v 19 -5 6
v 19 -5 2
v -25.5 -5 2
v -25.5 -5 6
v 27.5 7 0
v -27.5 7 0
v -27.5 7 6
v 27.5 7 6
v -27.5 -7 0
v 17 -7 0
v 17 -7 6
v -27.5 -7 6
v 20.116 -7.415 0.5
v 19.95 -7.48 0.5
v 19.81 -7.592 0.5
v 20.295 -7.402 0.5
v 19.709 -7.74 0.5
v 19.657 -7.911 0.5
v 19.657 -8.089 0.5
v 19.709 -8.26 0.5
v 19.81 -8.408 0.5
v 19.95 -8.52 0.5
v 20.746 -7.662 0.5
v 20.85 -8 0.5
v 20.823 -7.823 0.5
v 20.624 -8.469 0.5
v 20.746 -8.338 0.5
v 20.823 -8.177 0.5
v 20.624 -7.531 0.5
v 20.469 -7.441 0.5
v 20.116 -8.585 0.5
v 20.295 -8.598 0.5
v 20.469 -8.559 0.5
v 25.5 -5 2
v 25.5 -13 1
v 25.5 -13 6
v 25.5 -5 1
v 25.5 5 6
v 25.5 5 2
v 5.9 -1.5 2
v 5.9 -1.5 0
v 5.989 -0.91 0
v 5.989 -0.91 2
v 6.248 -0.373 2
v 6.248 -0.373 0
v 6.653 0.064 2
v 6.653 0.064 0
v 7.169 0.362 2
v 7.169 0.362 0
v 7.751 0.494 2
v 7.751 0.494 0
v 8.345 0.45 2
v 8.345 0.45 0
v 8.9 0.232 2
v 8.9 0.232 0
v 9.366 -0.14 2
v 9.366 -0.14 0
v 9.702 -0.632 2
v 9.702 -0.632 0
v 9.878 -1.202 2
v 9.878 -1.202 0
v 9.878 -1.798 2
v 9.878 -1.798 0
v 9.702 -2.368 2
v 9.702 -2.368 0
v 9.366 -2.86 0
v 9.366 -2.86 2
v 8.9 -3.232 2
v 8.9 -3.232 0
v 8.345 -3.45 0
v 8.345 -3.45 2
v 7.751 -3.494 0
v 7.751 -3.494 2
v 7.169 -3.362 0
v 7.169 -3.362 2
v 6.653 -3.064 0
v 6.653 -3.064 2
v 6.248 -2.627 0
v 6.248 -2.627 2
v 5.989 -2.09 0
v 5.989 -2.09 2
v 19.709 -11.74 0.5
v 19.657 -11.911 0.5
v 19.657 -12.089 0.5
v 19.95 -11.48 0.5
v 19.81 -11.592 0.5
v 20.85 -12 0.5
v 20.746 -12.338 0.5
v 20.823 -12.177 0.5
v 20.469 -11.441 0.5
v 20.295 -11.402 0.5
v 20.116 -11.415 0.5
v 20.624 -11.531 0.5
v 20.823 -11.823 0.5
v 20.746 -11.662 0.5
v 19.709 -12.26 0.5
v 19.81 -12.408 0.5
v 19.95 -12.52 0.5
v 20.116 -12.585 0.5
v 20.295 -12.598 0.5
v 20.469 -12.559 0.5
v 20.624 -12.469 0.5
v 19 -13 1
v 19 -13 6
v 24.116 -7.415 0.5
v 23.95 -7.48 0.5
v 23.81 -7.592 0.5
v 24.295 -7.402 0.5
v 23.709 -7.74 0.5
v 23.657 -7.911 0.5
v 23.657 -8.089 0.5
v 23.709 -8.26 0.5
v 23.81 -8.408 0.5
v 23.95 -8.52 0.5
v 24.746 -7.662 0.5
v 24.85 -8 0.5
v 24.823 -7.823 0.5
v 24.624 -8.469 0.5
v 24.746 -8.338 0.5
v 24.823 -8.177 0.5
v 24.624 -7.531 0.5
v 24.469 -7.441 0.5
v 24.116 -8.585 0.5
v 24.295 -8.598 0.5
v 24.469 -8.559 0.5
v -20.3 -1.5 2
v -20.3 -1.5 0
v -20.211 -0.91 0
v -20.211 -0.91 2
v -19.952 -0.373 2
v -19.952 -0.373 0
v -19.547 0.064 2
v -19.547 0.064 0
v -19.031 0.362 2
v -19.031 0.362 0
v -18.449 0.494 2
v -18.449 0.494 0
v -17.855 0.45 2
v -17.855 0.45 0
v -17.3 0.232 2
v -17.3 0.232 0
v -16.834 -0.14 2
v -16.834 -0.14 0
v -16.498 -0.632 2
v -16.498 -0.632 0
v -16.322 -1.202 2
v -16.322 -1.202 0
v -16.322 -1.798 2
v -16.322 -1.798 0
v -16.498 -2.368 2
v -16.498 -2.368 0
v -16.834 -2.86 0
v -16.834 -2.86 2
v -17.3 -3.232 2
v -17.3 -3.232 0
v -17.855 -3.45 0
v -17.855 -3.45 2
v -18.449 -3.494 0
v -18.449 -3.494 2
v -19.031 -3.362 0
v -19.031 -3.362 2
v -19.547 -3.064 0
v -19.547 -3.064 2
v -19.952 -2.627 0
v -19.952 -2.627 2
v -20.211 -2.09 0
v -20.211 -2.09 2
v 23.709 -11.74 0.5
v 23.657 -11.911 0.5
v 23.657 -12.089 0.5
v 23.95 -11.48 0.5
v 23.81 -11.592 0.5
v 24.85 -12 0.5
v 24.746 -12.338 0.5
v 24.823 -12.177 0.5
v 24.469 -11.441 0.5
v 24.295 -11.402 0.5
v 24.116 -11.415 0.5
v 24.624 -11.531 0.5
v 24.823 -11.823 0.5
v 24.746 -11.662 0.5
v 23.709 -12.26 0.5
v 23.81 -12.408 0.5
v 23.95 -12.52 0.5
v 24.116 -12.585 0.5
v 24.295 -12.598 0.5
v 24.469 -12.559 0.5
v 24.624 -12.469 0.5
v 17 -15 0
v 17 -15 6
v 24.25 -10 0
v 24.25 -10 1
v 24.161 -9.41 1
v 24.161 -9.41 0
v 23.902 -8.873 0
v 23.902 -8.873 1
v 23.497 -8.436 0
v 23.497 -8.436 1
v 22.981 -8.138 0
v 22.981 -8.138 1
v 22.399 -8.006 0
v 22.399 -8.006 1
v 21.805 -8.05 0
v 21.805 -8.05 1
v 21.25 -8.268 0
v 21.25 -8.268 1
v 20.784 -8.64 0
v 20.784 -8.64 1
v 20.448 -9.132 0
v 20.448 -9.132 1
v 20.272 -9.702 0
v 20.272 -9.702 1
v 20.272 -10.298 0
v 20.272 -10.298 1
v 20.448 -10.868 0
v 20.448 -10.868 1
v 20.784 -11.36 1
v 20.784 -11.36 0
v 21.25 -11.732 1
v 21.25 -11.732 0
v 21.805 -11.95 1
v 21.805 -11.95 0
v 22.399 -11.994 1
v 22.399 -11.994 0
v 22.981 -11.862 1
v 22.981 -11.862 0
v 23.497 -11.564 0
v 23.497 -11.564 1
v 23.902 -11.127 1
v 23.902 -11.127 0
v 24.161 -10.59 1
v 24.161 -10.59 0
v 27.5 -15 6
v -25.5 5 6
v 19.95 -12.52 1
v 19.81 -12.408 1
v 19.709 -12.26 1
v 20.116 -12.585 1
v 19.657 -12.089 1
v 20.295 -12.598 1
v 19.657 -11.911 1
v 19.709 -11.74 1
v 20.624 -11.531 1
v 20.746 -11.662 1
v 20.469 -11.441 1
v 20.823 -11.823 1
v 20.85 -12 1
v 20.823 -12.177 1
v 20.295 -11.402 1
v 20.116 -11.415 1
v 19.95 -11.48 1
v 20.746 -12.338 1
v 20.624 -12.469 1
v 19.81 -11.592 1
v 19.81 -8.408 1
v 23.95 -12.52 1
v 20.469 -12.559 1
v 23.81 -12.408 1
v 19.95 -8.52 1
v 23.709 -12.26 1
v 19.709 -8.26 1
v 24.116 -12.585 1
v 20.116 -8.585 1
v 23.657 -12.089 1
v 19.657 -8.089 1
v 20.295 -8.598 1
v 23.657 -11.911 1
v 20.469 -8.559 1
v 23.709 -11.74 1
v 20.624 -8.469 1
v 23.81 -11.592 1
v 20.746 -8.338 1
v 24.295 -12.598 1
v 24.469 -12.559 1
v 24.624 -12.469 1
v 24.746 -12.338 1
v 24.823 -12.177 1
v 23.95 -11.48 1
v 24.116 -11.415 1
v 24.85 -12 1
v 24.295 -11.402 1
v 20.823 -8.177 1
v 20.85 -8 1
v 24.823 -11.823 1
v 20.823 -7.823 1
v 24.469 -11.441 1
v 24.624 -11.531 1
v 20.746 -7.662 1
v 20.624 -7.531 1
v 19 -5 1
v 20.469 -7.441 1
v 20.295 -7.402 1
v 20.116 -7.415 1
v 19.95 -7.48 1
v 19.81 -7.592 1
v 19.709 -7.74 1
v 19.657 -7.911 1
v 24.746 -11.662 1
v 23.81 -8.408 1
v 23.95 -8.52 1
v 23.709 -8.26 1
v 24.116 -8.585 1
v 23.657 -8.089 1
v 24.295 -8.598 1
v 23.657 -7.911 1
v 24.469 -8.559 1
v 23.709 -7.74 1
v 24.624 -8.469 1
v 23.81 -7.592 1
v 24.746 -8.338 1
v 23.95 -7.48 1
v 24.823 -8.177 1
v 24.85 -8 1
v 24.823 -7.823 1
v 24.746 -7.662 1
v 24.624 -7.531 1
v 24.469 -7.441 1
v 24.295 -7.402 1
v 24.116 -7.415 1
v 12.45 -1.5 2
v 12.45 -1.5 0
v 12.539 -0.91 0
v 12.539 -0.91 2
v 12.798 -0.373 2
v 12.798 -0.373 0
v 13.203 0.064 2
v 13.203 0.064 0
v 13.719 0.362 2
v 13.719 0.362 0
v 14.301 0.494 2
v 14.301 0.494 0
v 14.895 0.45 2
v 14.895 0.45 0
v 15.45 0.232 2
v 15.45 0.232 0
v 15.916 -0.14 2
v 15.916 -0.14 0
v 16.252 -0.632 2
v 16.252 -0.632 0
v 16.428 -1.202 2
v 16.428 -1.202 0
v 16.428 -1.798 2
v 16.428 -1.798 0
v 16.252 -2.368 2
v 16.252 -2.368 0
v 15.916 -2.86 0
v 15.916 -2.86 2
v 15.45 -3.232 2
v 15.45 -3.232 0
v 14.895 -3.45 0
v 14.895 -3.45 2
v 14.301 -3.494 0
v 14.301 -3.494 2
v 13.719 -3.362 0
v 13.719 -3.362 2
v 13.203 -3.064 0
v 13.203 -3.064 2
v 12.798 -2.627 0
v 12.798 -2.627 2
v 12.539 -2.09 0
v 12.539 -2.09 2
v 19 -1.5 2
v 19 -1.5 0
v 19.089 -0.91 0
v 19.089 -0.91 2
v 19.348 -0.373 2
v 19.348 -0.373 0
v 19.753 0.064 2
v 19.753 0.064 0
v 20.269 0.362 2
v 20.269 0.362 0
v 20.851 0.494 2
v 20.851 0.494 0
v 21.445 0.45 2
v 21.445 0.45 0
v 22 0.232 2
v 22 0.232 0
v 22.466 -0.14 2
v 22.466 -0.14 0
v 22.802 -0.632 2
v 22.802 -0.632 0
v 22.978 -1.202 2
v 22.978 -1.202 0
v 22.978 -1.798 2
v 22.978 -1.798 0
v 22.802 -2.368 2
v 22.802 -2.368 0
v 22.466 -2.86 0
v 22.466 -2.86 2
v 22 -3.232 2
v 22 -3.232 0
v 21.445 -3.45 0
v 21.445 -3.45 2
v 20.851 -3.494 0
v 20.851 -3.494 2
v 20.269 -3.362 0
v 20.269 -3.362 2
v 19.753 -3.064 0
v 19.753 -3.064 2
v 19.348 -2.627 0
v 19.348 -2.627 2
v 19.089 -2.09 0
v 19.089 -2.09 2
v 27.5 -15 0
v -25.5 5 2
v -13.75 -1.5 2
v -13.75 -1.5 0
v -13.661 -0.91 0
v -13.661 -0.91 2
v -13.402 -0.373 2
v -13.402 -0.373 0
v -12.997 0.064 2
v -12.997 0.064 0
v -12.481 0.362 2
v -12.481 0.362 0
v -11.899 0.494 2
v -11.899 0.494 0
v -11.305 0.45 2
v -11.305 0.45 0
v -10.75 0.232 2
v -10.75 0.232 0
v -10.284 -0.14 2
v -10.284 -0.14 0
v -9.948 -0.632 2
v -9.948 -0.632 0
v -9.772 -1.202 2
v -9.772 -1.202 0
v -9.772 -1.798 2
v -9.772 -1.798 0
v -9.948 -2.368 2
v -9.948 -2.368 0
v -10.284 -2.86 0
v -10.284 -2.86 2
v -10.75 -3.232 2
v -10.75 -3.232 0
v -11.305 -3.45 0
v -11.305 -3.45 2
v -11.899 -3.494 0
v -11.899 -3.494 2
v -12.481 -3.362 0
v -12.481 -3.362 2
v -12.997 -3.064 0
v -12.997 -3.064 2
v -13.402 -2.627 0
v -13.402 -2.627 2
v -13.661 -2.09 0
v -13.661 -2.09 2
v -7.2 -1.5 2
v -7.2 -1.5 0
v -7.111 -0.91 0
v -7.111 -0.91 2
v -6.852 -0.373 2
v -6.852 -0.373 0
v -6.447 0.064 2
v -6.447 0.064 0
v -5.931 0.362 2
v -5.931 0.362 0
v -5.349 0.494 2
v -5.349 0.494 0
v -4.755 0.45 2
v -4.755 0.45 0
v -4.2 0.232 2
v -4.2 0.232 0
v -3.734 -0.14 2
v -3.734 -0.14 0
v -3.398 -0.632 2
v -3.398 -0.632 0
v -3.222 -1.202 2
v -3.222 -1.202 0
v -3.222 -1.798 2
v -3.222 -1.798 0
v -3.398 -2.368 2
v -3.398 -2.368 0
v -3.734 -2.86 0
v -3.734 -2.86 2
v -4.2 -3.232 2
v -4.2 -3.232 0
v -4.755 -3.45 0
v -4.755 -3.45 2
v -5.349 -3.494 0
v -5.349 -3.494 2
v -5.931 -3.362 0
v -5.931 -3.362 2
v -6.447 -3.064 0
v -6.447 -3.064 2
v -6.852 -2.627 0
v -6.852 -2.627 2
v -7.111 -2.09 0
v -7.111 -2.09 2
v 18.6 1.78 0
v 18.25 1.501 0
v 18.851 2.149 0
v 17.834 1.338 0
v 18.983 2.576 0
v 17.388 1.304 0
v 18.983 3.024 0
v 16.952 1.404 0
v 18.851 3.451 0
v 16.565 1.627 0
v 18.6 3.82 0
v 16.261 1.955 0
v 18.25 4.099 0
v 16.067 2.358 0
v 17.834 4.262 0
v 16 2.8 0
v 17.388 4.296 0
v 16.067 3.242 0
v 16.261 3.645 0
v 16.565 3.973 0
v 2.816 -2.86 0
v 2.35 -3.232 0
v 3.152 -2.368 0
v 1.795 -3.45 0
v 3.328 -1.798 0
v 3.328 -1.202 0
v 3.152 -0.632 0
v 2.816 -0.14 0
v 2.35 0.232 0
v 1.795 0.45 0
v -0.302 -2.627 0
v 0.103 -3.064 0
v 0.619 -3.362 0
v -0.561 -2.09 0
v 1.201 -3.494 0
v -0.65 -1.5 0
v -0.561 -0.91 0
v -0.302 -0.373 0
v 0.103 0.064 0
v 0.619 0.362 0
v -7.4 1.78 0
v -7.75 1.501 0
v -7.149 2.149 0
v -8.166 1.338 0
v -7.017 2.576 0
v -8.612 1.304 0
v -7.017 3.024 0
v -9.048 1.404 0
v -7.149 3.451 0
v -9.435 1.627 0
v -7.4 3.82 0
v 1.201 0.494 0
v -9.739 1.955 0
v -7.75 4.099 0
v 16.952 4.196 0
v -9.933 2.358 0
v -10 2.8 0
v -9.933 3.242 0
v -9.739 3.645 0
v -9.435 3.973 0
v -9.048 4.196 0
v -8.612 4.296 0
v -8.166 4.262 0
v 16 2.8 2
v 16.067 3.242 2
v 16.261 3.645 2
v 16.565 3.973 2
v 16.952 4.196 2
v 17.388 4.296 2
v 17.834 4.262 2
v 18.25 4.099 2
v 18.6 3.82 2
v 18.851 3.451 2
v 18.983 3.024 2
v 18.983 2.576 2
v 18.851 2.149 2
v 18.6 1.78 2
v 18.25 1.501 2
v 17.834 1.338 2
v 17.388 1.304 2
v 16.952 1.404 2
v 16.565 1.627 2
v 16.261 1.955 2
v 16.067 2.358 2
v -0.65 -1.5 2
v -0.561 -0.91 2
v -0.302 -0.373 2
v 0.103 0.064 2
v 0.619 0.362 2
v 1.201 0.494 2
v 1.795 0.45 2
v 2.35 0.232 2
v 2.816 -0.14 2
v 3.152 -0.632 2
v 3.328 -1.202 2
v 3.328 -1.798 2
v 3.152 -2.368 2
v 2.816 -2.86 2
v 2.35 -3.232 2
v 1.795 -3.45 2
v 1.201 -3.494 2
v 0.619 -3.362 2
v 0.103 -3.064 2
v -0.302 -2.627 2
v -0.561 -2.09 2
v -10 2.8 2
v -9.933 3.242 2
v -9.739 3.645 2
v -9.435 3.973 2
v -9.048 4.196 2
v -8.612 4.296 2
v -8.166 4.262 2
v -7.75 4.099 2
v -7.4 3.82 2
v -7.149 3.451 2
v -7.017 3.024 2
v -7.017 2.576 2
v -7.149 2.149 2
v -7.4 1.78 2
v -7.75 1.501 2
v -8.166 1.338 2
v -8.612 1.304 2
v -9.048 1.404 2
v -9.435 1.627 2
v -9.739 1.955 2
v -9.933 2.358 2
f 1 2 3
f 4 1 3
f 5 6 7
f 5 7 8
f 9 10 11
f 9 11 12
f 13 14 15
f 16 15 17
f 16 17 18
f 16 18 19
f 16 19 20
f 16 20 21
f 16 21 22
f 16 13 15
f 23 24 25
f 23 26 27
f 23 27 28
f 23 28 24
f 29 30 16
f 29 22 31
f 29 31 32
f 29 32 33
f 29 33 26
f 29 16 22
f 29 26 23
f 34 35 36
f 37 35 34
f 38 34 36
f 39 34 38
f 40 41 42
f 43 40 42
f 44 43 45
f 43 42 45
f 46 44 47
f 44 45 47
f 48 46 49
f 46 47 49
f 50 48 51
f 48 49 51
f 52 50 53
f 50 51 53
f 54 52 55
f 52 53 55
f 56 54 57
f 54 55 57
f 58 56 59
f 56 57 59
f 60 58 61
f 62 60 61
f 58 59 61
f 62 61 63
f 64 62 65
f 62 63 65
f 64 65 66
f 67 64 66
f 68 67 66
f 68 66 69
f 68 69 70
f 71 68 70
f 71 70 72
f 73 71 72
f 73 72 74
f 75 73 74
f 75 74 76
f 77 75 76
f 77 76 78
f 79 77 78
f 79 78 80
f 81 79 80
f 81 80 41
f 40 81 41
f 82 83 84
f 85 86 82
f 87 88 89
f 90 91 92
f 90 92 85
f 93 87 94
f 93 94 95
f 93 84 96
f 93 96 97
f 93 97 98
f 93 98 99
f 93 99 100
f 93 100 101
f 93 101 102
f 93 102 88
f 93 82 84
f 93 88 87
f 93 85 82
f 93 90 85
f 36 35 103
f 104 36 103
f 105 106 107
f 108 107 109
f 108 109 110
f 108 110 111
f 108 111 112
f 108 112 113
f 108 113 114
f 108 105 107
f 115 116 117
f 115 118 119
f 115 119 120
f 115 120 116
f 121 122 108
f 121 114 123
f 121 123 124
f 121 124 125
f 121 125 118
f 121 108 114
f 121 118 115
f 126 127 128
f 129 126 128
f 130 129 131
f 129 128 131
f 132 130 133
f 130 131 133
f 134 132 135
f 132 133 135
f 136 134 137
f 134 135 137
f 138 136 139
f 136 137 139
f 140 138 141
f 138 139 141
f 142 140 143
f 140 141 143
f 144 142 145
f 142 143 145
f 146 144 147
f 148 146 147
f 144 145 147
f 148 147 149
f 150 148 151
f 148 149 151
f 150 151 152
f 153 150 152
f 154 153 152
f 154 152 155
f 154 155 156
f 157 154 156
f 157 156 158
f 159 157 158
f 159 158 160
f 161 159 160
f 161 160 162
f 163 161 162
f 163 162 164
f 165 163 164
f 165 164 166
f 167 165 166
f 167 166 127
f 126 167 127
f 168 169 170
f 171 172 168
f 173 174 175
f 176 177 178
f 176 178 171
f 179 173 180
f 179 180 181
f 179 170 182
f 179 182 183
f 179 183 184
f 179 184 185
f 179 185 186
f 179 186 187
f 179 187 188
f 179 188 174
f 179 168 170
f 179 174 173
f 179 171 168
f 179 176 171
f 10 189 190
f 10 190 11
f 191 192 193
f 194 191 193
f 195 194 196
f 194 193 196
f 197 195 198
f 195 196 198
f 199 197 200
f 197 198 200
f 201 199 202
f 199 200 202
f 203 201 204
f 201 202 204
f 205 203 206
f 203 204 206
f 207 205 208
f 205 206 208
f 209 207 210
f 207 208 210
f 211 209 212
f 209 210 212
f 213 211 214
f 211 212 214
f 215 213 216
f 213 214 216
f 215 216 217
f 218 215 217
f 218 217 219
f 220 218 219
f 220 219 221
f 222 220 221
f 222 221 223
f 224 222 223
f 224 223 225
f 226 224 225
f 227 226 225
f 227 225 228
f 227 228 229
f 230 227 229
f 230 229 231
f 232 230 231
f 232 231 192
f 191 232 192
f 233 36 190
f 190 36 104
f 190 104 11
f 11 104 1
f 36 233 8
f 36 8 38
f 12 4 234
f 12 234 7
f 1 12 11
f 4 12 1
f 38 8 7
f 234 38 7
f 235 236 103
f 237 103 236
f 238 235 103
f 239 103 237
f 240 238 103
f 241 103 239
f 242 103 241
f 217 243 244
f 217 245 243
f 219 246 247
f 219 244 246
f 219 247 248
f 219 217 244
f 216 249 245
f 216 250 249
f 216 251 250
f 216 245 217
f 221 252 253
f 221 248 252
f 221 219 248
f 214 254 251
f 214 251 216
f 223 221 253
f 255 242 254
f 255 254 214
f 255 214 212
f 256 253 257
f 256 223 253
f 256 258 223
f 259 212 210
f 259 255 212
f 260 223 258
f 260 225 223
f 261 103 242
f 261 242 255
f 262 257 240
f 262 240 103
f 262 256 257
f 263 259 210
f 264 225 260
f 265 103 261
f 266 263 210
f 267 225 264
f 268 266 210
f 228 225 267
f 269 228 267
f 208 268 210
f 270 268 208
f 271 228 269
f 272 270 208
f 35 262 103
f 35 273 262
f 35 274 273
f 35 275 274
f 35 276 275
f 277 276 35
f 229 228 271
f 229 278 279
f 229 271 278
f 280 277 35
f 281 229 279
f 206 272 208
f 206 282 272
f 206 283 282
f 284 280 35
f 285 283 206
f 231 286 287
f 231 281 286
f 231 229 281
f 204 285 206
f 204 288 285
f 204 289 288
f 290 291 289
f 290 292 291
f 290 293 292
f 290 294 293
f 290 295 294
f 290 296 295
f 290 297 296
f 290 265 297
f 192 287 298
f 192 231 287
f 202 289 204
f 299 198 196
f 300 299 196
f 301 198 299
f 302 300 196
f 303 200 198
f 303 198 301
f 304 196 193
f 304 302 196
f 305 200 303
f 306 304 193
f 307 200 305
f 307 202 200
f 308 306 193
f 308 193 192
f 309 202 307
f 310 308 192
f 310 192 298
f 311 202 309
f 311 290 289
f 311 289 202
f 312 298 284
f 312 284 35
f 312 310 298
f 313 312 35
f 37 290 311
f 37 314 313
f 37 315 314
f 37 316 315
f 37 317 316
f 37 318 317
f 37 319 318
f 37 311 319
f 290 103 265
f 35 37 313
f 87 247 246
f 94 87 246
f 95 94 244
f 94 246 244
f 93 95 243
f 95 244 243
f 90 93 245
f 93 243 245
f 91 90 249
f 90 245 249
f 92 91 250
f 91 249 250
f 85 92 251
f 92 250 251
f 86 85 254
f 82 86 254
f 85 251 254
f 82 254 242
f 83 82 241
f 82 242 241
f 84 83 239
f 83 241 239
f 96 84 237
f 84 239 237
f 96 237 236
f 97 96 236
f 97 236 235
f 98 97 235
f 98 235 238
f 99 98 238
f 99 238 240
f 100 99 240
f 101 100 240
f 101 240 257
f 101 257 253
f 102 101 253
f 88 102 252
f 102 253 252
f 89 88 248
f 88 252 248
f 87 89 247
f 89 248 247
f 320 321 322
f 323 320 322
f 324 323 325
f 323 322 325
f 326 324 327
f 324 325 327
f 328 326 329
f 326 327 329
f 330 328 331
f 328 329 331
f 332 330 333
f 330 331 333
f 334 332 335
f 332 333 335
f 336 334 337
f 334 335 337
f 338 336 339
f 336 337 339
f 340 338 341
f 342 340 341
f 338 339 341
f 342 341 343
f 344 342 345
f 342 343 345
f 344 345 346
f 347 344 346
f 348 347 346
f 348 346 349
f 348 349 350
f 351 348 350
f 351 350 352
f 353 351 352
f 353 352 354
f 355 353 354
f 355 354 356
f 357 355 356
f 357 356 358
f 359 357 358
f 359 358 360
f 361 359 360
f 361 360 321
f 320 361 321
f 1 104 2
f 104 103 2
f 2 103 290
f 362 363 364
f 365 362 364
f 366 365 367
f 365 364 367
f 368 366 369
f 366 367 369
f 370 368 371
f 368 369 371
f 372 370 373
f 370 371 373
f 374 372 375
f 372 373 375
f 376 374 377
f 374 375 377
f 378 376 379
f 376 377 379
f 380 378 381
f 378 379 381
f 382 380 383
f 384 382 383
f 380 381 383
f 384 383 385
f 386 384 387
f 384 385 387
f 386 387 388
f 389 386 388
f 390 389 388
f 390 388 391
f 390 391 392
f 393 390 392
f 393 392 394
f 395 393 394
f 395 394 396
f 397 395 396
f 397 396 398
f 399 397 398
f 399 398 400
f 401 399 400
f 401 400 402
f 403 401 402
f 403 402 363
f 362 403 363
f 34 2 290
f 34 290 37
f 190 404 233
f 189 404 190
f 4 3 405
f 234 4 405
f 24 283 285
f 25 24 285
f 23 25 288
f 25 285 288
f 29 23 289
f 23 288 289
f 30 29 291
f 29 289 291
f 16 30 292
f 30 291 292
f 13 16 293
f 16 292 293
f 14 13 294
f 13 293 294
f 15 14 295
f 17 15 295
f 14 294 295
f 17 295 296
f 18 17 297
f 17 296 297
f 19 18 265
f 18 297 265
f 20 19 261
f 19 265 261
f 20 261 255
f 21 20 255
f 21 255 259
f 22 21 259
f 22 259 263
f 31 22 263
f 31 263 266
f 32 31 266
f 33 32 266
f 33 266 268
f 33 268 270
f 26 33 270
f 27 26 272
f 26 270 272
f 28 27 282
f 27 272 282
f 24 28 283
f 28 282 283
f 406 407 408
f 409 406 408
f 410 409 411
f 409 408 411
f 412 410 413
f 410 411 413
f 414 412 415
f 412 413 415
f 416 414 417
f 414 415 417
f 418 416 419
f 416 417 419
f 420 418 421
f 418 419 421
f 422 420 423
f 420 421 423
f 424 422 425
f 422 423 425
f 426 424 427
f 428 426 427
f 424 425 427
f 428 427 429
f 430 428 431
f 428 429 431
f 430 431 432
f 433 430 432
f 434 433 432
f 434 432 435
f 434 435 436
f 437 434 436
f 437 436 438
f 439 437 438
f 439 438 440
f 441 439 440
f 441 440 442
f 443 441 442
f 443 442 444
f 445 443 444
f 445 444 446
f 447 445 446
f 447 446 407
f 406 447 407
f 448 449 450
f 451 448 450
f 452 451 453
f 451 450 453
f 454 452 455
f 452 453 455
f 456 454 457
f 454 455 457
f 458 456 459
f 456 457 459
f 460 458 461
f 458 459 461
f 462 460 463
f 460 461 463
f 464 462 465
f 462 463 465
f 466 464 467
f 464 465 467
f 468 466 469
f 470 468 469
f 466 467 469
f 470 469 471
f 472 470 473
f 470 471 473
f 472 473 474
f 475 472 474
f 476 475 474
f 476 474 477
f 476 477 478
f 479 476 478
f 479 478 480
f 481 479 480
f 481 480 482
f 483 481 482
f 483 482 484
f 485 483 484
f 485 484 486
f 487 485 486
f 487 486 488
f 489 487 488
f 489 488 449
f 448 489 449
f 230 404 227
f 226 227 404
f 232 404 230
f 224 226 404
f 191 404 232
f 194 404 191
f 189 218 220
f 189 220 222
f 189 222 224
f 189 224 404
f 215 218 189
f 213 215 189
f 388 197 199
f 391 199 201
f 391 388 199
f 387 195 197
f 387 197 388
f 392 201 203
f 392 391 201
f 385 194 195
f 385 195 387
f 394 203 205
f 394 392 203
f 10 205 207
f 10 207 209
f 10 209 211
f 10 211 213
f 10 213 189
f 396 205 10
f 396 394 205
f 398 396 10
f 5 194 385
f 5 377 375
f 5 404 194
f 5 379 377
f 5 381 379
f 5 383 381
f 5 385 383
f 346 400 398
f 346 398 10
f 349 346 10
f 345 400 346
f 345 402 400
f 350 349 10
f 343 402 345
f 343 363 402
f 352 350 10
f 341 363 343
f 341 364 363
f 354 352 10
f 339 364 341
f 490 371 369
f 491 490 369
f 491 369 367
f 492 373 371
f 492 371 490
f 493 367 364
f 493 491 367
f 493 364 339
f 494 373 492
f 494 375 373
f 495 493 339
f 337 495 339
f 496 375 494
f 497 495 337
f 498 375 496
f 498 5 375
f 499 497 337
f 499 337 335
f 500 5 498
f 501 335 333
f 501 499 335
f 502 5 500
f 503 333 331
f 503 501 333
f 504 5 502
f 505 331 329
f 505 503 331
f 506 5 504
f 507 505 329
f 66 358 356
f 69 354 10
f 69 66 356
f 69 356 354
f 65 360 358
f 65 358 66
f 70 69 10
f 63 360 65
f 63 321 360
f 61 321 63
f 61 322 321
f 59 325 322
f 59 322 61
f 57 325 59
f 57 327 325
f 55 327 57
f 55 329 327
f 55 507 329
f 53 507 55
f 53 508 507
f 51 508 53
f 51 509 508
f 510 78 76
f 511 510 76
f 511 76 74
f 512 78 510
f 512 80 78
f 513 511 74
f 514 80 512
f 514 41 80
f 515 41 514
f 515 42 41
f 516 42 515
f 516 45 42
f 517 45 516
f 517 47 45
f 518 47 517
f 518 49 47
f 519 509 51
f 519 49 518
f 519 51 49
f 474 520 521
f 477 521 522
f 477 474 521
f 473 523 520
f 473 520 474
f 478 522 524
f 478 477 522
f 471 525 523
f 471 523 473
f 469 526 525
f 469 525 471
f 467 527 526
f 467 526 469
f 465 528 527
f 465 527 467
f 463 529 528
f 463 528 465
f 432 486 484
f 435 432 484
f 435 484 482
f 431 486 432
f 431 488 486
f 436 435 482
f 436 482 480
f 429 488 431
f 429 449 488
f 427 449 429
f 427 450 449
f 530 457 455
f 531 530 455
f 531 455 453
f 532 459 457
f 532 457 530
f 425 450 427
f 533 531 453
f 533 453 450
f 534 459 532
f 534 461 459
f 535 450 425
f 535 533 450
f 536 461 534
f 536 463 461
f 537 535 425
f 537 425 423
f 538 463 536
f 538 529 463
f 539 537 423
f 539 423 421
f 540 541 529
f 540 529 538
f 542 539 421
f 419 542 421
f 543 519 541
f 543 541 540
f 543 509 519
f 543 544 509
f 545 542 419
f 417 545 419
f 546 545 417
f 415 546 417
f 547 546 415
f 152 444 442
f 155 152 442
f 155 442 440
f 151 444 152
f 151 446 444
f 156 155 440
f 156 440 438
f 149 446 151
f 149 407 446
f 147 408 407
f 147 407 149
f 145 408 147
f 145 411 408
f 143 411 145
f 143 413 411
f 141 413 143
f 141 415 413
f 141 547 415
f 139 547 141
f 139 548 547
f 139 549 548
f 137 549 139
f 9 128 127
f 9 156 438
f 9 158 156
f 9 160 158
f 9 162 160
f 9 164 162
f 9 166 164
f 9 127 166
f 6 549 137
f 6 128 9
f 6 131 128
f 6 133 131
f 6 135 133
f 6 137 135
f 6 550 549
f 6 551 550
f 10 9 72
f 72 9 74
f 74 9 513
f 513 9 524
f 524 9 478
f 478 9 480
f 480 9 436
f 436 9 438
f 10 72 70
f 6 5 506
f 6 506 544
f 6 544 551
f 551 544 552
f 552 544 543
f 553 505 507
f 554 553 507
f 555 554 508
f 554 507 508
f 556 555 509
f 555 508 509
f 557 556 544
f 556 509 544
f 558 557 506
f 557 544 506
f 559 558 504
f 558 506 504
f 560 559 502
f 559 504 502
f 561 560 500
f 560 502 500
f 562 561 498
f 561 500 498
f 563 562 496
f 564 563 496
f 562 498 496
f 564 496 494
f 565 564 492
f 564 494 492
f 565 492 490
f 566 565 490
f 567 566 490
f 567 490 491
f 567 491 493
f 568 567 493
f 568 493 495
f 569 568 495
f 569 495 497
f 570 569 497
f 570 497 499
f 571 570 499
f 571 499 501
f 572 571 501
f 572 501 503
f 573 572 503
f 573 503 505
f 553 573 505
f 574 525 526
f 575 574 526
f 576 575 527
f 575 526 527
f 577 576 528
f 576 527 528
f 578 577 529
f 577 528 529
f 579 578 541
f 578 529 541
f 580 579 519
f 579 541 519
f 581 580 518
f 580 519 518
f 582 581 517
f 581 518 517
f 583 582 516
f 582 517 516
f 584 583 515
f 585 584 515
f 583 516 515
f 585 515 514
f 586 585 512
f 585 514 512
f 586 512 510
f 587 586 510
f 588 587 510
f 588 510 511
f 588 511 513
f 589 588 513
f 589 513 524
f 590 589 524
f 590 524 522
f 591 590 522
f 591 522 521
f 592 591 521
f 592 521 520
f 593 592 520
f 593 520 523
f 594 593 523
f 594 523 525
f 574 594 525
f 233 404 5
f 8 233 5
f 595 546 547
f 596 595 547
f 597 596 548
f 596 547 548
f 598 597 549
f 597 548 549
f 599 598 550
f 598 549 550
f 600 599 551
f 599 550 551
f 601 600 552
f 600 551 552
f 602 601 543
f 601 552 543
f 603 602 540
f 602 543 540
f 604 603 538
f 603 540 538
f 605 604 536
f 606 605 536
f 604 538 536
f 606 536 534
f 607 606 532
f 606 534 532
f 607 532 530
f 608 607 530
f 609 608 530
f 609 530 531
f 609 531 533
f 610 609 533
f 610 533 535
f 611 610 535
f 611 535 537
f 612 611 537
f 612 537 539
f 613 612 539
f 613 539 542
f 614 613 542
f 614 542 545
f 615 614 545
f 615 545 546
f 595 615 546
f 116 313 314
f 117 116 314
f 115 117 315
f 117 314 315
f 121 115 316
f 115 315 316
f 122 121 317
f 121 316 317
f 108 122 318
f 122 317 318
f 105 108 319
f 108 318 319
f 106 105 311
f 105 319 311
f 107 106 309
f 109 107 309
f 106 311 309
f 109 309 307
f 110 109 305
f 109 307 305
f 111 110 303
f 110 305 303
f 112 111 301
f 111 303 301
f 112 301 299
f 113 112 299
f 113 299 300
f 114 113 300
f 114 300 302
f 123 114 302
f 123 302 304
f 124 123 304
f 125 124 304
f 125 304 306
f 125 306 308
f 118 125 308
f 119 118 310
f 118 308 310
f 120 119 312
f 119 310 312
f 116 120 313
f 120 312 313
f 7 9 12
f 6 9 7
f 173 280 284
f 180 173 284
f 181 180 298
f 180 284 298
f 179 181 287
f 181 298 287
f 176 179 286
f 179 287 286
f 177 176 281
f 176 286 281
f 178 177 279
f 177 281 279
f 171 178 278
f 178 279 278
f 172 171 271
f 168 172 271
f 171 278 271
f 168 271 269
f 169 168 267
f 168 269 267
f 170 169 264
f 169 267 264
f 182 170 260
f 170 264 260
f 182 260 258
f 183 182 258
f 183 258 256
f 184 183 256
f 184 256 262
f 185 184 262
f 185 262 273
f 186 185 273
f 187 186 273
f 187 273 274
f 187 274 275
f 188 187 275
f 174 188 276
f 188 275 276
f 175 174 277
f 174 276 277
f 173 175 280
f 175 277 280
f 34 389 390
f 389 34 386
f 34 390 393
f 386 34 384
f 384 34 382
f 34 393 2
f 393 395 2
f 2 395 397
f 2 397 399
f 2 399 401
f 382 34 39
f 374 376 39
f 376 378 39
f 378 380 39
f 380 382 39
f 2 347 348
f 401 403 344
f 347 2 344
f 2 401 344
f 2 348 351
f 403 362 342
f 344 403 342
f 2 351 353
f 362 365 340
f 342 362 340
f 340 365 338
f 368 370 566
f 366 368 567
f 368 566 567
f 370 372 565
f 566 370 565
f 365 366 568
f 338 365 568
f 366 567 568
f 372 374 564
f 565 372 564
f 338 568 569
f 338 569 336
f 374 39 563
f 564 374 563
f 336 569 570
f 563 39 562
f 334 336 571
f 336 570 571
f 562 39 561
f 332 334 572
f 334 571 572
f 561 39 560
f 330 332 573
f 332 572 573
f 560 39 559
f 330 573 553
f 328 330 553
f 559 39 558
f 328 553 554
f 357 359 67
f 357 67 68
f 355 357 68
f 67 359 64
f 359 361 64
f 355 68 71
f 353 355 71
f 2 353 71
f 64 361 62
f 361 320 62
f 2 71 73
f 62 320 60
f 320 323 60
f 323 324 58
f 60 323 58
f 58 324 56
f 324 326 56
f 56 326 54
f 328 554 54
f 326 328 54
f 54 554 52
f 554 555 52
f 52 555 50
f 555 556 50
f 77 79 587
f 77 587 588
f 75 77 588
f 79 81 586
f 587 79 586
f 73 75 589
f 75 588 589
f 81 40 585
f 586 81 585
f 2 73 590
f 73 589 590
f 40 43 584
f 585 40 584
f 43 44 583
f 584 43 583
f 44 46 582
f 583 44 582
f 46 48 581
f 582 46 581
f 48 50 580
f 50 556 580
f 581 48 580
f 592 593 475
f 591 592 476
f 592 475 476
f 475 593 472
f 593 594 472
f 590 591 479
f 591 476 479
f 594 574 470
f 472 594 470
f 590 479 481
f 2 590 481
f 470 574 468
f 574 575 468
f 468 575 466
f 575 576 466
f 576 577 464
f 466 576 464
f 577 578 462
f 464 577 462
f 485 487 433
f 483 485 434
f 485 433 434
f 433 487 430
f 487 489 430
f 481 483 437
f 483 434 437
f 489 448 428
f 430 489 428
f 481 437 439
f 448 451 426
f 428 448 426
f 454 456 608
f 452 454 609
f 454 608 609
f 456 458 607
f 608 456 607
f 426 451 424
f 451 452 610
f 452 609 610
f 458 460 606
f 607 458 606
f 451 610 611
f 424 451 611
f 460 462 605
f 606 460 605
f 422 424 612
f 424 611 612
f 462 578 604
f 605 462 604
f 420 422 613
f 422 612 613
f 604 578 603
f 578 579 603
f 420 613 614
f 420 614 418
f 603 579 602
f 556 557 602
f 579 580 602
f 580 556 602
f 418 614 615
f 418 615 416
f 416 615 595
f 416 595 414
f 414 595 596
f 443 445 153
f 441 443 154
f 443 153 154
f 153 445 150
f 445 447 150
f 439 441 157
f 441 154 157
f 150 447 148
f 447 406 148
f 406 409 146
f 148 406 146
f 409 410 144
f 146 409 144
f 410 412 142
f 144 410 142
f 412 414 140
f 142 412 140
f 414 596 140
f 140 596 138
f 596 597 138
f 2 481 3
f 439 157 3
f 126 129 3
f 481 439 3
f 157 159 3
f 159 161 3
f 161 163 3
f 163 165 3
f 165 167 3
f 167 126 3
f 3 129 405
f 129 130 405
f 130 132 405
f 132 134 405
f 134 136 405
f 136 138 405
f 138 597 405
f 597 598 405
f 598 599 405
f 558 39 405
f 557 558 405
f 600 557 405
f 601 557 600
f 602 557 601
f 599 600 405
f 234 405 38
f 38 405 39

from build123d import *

# Parameters (mm, degrees)
BOSS_EXTRUDE1_DEPTH = 6
SHELL1_T            = -2
SKETCH3_R           = 2
CUT_EXTRUDE1_DEPTH  = 32.894356868
SKETCH9_R           = 1.5
CUT_EXTRUDE6_DEPTH  = 32.894356868
SKETCH11_R          = 2
CUT_EXTRUDE7_DEPTH  = 32.579265349
SKETCH12_W          = 6.5
SKETCH12_H          = 8
CUT_EXTRUDE8_DEPTH  = 1
SKETCH13_R          = 0.6
CUT_EXTRUDE9_DEPTH  = 0.5


with BuildPart() as part:
    # Sketch1 → Boss-Extrude1 (new body)
    with BuildSketch(Plane.XY):
        Polygon((17, -7), (-27.5, -7), (-27.5, 7), (27.5, 7), (27.5, -7), (27.5, -15), (17, -15), align=None)
    extrude(amount=BOSS_EXTRUDE1_DEPTH)

    # Shell1
    shell1_openings = [part.faces().sort_by_distance(p)[0] for p in [
        (2.18852459, -1.081967213, 6),
    ]]
    offset(amount=SHELL1_T, openings=shell1_openings, kind=Kind.INTERSECTION)

    # Sketch3 → Cut-Extrude1 (cut, through all)
    with BuildSketch(Plane(origin=(0, 0, 0), x_dir=(-1, 0, 0), z_dir=(0, 0, -1))):
        with Locations((-21, -1.5)):
            Circle(SKETCH3_R)
        with Locations((-14.45, -1.5)):
            Circle(SKETCH3_R)
        with Locations((-7.9, -1.5)):
            Circle(SKETCH3_R)
        with Locations((-1.35, -1.5)):
            Circle(SKETCH3_R)
        with Locations((5.2, -1.5)):
            Circle(SKETCH3_R)
        with Locations((11.75, -1.5)):
            Circle(SKETCH3_R)
        with Locations((18.3, -1.5)):
            Circle(SKETCH3_R)
    extrude(amount=-CUT_EXTRUDE1_DEPTH, mode=Mode.SUBTRACT)

    # Sketch9 → Cut-Extrude6 (cut, through all)
    with BuildSketch(Plane(origin=(0, 0, 0), x_dir=(-1, 0, 0), z_dir=(0, 0, -1))):
        with Locations((-17.5, 2.8)):
            Circle(SKETCH9_R)
        with Locations((8.5, 2.8)):
            Circle(SKETCH9_R)
    extrude(amount=-CUT_EXTRUDE6_DEPTH, mode=Mode.SUBTRACT)

    # Sketch11 → Cut-Extrude7 (cut, through all)
    with BuildSketch(Plane.XY.offset(2)):
        with Locations((22.25, -10)):
            Circle(SKETCH11_R)
    extrude(amount=-CUT_EXTRUDE7_DEPTH, mode=Mode.SUBTRACT)

    # Sketch12 → Cut-Extrude8 (cut)
    with BuildSketch(Plane.XY.offset(2)):
        with Locations((22.25, -9)):
            Rectangle(SKETCH12_W, SKETCH12_H)
    extrude(amount=-CUT_EXTRUDE8_DEPTH, mode=Mode.SUBTRACT)

    # Sketch13 → Cut-Extrude9 (cut)
    with BuildSketch(Plane.XY.offset(1)):
        with Locations((20.25, -8)):
            Circle(SKETCH13_R)
        with Locations((24.25, -8)):
            Circle(SKETCH13_R)
        with Locations((24.25, -12)):
            Circle(SKETCH13_R)
        with Locations((20.25, -12)):
            Circle(SKETCH13_R)
    extrude(amount=-CUT_EXTRUDE9_DEPTH, mode=Mode.SUBTRACT)


solid = part.part
